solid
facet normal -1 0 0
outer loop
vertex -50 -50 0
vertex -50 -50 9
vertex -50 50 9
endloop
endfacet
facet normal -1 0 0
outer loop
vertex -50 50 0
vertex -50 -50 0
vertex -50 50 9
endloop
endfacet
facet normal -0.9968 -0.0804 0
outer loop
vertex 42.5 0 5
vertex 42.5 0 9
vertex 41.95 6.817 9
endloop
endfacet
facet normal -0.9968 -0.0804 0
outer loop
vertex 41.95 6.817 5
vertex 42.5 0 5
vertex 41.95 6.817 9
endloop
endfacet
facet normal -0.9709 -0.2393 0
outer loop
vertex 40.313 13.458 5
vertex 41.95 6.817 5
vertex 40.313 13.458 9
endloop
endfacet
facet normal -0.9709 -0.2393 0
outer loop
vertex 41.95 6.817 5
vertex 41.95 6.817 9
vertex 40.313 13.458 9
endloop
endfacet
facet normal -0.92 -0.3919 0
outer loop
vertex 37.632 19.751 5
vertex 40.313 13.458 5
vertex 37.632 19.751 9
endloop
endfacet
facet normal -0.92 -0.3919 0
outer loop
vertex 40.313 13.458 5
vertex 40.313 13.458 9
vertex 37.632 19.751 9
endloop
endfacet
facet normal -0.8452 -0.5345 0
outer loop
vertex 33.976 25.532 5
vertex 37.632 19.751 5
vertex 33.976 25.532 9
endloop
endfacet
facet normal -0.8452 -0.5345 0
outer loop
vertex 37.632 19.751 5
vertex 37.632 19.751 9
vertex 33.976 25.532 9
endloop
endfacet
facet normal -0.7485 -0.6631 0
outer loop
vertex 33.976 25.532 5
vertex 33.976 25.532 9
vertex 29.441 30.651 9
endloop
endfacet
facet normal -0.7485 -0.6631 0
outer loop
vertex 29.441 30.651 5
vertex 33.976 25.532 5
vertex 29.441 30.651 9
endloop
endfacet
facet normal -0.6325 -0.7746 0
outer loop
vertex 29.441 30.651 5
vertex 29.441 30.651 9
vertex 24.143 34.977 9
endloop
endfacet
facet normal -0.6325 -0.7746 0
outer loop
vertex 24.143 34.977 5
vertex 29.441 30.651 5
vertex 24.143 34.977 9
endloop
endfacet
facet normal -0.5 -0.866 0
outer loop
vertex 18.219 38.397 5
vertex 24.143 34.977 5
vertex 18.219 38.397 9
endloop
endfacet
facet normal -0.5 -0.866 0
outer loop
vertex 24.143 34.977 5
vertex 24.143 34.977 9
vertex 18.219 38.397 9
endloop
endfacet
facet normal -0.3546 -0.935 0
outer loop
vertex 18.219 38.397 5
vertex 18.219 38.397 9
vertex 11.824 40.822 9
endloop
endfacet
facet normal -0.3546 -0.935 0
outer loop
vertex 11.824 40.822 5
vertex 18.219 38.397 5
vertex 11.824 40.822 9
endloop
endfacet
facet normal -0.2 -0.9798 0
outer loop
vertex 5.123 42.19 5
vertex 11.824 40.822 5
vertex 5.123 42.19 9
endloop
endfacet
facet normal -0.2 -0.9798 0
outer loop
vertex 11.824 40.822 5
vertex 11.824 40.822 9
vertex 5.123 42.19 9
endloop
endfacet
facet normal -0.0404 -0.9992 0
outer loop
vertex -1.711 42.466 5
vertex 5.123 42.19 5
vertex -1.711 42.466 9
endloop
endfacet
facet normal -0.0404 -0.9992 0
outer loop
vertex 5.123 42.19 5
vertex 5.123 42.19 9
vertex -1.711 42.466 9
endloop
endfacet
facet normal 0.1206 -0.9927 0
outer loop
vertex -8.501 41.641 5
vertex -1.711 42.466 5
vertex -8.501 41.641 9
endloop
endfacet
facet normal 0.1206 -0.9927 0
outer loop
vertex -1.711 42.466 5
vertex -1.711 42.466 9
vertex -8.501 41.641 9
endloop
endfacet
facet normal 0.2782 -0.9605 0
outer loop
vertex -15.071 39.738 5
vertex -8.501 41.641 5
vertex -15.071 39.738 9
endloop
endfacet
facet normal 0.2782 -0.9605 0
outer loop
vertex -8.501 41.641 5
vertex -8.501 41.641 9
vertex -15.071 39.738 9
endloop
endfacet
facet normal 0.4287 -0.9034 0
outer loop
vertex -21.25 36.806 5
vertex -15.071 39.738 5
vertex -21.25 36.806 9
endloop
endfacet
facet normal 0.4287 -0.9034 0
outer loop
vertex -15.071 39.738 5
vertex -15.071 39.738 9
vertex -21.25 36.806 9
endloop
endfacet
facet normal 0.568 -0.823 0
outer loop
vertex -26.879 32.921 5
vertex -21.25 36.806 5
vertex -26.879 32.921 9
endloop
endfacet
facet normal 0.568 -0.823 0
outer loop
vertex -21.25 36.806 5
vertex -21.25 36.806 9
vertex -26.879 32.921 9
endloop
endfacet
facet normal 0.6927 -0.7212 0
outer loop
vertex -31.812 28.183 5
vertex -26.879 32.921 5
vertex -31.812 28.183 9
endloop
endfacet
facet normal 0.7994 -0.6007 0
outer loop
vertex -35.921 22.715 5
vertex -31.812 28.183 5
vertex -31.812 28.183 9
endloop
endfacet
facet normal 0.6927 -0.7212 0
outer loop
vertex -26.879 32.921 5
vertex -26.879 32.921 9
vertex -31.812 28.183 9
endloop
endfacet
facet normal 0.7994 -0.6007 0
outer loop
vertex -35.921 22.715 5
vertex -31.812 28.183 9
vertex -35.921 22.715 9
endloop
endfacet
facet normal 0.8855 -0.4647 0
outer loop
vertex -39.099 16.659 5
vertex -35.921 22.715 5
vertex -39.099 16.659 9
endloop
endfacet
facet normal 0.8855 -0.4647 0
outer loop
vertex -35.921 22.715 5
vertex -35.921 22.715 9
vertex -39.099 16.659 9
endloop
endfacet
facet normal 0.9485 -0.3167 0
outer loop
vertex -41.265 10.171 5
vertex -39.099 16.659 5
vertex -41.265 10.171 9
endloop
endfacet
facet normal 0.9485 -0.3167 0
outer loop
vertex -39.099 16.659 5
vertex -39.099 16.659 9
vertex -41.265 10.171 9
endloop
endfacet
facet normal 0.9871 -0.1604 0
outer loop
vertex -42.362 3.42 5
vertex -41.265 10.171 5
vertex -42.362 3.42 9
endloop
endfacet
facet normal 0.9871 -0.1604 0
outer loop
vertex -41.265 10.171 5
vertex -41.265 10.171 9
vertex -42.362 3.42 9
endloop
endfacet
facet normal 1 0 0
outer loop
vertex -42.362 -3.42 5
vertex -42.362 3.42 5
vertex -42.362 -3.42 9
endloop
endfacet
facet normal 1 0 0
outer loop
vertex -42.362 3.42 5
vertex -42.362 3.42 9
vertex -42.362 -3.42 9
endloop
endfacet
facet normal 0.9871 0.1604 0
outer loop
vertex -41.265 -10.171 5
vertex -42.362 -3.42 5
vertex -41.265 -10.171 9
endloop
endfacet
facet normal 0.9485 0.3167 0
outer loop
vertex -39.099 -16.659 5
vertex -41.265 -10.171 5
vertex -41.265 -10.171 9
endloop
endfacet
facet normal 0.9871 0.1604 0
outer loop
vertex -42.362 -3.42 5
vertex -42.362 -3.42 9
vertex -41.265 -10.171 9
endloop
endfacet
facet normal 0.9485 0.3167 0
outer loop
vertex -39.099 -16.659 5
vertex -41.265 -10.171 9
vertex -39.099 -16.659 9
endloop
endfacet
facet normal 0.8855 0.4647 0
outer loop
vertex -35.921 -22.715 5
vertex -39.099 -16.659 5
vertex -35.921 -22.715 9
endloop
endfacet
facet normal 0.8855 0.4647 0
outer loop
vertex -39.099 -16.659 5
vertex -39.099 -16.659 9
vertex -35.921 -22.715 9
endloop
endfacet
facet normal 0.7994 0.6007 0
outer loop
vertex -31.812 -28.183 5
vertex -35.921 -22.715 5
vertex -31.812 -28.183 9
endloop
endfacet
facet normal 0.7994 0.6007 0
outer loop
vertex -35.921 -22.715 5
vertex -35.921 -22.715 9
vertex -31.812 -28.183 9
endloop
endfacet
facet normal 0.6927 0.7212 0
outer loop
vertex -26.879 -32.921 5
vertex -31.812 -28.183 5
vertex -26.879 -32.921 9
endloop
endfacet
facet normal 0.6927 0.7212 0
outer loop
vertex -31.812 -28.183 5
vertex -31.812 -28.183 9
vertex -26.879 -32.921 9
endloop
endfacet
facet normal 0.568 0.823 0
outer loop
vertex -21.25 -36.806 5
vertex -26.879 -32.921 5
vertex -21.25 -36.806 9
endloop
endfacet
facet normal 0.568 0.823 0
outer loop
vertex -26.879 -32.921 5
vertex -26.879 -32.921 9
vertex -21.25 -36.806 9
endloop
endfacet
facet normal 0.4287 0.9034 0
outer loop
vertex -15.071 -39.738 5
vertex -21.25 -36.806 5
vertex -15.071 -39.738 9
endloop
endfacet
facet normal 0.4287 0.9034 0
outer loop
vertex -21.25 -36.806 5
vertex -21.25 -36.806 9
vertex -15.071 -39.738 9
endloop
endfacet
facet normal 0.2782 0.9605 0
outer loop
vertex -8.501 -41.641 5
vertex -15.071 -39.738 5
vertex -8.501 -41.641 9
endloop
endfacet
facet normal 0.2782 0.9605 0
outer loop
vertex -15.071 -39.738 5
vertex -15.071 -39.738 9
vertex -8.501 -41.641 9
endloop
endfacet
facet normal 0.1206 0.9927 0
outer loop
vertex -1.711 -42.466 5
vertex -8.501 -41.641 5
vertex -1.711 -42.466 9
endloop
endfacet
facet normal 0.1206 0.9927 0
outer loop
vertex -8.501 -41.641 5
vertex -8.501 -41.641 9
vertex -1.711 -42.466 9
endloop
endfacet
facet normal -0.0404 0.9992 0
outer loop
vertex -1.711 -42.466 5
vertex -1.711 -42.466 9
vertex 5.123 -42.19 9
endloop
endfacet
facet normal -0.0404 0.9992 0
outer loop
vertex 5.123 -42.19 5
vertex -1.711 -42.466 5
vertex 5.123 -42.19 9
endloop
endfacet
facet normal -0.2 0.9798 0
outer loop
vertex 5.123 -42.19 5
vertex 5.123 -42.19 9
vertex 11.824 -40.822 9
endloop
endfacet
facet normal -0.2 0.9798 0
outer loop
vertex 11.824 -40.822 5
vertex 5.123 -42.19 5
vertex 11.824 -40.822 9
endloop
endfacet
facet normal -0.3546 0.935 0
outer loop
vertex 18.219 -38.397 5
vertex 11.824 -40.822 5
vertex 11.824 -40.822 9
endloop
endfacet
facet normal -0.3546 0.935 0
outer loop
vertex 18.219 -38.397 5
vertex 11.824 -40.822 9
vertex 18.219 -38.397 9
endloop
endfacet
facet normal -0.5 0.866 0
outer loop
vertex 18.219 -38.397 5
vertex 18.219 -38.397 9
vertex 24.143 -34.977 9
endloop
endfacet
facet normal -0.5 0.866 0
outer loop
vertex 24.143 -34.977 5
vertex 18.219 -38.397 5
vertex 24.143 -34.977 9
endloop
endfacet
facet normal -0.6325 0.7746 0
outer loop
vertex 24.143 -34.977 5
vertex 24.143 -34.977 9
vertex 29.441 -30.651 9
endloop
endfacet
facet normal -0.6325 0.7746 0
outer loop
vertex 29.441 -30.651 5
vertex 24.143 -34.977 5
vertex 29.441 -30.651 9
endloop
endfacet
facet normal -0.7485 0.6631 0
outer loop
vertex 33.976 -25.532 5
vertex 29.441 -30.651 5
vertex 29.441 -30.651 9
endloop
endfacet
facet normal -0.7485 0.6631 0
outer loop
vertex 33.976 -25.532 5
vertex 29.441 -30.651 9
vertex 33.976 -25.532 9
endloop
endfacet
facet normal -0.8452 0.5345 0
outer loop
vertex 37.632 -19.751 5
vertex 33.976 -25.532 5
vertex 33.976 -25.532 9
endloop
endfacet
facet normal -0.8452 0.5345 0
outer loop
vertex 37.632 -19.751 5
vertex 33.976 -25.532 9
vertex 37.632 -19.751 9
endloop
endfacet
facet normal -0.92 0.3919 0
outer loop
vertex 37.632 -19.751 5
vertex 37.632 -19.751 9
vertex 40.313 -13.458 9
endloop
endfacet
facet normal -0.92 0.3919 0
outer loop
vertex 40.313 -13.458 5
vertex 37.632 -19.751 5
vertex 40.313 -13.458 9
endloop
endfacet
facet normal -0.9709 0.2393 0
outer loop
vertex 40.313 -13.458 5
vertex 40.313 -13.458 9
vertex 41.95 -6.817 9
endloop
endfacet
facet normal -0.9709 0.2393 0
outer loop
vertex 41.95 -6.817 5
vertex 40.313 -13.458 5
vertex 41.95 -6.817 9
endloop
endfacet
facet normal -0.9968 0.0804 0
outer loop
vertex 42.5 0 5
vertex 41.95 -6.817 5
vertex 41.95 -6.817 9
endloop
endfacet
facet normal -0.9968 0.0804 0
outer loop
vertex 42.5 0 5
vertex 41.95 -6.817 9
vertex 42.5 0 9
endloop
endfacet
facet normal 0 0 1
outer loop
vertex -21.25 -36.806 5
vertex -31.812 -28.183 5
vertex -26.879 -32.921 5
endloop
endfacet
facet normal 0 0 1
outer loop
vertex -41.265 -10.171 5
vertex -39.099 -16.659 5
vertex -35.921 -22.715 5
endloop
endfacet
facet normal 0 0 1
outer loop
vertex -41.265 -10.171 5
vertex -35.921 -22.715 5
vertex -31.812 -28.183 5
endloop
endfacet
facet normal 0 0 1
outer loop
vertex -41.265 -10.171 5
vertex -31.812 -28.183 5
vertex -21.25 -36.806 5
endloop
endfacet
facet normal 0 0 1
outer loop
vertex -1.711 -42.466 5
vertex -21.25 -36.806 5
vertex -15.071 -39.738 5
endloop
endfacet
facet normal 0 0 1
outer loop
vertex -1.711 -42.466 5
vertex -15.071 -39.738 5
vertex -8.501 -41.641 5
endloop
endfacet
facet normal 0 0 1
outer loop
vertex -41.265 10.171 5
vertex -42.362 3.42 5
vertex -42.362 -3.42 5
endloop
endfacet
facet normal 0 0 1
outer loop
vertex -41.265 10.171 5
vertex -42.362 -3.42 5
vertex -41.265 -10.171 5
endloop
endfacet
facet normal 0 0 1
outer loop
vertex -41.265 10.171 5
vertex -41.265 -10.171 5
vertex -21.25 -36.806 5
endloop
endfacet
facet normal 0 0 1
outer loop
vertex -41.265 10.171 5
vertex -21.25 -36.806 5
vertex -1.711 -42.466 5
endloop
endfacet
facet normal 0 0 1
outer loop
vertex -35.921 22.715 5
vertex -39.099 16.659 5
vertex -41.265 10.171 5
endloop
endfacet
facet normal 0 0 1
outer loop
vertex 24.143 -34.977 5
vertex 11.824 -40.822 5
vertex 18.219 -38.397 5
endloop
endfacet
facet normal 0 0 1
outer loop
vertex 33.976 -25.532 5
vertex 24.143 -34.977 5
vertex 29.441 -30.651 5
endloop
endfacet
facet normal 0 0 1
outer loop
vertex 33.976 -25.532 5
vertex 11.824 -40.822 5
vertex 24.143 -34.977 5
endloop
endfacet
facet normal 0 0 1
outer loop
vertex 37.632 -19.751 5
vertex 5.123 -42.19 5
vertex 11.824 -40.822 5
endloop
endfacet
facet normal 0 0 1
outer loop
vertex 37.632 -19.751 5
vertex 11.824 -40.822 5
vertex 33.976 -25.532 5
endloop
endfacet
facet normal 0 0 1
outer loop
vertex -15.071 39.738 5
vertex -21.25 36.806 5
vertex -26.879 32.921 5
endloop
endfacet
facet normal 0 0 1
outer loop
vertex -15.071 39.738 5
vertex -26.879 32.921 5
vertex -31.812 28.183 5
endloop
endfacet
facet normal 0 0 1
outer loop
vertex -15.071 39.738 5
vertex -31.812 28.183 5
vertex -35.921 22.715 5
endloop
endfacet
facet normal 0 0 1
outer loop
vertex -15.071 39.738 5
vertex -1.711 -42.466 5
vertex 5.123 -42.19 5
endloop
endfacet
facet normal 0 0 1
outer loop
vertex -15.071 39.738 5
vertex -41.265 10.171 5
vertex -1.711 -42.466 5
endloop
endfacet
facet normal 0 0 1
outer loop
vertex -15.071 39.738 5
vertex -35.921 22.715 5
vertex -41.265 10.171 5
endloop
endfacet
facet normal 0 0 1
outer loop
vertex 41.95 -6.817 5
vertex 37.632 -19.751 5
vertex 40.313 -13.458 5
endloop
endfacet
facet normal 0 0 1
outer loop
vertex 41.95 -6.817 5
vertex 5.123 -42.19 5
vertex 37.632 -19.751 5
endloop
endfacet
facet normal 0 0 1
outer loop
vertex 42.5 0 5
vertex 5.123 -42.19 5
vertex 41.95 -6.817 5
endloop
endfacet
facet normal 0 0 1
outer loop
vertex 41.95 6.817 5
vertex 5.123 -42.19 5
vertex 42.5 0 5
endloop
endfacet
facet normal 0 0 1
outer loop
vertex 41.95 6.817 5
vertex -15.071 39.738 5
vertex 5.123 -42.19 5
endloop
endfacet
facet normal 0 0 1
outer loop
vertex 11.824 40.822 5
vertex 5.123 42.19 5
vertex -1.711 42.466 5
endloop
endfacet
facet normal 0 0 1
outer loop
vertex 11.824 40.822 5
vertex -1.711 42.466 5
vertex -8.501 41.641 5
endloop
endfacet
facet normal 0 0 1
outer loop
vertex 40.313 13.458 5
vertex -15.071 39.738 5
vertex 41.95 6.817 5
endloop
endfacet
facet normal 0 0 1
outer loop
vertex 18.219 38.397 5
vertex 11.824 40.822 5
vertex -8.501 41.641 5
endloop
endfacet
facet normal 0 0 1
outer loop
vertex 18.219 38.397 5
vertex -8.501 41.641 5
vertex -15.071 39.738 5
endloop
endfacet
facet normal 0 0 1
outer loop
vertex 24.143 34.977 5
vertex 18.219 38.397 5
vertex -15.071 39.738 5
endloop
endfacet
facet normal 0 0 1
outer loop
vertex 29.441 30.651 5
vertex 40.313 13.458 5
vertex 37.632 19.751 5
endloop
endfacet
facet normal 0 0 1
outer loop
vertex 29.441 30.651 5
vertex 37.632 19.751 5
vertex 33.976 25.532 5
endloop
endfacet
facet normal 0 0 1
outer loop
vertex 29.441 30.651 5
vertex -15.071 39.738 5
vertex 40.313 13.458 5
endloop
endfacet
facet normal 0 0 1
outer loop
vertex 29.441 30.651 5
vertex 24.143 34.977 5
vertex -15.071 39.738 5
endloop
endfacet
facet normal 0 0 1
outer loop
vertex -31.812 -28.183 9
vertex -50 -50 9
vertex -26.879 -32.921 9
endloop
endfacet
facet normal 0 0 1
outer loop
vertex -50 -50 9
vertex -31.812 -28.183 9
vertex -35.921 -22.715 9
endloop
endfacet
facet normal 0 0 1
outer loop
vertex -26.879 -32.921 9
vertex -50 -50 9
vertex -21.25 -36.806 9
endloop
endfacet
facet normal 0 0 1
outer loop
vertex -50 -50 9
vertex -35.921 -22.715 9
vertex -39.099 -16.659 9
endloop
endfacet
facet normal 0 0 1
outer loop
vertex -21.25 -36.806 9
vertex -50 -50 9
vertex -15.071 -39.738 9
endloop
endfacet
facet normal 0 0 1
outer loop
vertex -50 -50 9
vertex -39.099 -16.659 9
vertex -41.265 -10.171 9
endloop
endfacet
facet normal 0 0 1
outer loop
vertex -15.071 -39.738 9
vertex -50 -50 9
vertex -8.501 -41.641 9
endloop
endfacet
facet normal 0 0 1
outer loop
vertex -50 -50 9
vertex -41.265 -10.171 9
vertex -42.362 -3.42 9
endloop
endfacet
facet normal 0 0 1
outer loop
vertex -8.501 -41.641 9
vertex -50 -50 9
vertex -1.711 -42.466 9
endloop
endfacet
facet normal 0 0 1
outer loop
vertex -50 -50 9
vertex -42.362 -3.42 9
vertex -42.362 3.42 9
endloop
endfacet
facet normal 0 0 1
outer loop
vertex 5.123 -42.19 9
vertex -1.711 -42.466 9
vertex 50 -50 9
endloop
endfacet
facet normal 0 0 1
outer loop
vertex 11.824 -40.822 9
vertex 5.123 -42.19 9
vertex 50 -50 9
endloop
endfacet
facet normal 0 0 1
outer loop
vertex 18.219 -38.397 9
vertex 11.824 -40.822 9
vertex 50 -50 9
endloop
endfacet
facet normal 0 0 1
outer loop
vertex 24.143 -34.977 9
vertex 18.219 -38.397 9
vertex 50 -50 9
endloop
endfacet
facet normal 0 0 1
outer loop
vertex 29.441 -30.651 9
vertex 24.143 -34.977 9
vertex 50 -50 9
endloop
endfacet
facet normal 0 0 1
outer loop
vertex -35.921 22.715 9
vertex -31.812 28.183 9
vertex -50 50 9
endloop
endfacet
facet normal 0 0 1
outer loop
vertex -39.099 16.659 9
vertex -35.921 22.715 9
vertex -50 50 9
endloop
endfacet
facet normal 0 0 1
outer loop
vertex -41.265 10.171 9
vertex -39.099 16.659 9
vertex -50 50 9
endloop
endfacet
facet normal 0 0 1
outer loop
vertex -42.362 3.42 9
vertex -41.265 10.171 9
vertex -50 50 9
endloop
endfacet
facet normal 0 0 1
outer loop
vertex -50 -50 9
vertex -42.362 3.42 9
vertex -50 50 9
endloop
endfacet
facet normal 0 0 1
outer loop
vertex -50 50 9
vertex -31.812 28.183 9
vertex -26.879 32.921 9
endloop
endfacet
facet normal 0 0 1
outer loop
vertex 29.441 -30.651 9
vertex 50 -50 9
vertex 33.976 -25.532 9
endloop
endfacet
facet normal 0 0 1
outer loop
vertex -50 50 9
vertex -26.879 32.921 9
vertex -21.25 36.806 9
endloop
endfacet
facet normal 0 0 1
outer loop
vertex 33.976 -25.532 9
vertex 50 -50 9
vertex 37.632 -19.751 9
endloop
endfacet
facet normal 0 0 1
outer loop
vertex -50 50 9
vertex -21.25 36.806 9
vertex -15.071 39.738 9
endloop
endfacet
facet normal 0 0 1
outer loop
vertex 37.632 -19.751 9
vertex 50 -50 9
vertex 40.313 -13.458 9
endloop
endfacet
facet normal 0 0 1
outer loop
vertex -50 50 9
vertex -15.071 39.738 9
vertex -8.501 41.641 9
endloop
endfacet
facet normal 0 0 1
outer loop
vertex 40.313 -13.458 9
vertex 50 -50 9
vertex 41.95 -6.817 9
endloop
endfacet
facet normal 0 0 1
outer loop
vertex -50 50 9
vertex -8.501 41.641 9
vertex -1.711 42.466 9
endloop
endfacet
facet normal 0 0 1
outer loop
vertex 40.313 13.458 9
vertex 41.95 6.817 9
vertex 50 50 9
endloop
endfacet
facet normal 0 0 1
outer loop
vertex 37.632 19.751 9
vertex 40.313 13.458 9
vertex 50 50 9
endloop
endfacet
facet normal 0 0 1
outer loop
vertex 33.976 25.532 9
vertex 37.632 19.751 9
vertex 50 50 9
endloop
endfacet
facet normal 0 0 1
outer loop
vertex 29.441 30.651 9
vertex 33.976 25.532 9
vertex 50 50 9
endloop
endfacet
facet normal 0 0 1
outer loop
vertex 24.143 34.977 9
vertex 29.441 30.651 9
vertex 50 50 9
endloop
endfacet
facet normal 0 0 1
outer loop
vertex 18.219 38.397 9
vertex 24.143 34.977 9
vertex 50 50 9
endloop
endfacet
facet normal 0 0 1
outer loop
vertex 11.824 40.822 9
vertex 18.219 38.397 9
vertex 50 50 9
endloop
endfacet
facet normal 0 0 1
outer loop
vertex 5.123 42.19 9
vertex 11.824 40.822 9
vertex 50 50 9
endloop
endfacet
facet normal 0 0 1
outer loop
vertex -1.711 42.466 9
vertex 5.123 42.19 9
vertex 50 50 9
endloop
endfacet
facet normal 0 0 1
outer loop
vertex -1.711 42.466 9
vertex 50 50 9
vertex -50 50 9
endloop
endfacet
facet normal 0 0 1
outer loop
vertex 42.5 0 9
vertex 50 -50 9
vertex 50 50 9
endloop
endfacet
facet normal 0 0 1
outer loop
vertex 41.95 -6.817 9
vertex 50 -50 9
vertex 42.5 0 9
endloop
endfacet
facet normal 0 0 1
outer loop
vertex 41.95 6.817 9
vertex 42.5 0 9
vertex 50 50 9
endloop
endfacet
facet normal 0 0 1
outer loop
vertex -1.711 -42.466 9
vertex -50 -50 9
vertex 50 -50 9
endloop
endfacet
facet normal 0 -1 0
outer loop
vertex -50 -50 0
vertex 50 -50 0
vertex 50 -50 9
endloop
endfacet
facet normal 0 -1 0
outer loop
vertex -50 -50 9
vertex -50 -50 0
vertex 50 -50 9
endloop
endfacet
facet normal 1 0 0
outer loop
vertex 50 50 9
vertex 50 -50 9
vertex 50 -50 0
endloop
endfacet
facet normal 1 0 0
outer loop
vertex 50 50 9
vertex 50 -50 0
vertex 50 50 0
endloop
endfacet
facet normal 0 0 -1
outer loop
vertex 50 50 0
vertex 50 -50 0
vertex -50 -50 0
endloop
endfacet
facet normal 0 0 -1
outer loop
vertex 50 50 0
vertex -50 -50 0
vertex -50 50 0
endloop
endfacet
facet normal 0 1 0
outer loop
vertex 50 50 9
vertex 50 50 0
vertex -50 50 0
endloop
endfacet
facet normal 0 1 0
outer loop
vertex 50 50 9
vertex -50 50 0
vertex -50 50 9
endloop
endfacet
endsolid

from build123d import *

# Parameters (mm, degrees)
SKETCH4_W               = 100
SKETCH4_H               = 9
BOSS_EXTRUDE3_DEPTH     = 50
SKETCH5_R               = 42.5
CUT_EXTRUDE1_DEPTH      = 1
CUT_EXTRUDE1_DEPTH_BACK = 4


with BuildPart() as part:
    # Sketch4 → Boss-Extrude3 (new body, symmetric)
    with BuildSketch(Plane.YZ):
        with Locations((0, 4.5)):
            Rectangle(SKETCH4_W, SKETCH4_H)
    extrude(amount=BOSS_EXTRUDE3_DEPTH, both=True)

    # Sketch5 → Cut-Extrude1 (cut, two sides)
    with BuildSketch(Plane.XY.offset(9)) as cut_extrude1_sk:
        Circle(SKETCH5_R)
    extrude(amount=CUT_EXTRUDE1_DEPTH, mode=Mode.SUBTRACT)
    extrude(cut_extrude1_sk.sketch, amount=-CUT_EXTRUDE1_DEPTH_BACK, mode=Mode.SUBTRACT)


solid = part.part
